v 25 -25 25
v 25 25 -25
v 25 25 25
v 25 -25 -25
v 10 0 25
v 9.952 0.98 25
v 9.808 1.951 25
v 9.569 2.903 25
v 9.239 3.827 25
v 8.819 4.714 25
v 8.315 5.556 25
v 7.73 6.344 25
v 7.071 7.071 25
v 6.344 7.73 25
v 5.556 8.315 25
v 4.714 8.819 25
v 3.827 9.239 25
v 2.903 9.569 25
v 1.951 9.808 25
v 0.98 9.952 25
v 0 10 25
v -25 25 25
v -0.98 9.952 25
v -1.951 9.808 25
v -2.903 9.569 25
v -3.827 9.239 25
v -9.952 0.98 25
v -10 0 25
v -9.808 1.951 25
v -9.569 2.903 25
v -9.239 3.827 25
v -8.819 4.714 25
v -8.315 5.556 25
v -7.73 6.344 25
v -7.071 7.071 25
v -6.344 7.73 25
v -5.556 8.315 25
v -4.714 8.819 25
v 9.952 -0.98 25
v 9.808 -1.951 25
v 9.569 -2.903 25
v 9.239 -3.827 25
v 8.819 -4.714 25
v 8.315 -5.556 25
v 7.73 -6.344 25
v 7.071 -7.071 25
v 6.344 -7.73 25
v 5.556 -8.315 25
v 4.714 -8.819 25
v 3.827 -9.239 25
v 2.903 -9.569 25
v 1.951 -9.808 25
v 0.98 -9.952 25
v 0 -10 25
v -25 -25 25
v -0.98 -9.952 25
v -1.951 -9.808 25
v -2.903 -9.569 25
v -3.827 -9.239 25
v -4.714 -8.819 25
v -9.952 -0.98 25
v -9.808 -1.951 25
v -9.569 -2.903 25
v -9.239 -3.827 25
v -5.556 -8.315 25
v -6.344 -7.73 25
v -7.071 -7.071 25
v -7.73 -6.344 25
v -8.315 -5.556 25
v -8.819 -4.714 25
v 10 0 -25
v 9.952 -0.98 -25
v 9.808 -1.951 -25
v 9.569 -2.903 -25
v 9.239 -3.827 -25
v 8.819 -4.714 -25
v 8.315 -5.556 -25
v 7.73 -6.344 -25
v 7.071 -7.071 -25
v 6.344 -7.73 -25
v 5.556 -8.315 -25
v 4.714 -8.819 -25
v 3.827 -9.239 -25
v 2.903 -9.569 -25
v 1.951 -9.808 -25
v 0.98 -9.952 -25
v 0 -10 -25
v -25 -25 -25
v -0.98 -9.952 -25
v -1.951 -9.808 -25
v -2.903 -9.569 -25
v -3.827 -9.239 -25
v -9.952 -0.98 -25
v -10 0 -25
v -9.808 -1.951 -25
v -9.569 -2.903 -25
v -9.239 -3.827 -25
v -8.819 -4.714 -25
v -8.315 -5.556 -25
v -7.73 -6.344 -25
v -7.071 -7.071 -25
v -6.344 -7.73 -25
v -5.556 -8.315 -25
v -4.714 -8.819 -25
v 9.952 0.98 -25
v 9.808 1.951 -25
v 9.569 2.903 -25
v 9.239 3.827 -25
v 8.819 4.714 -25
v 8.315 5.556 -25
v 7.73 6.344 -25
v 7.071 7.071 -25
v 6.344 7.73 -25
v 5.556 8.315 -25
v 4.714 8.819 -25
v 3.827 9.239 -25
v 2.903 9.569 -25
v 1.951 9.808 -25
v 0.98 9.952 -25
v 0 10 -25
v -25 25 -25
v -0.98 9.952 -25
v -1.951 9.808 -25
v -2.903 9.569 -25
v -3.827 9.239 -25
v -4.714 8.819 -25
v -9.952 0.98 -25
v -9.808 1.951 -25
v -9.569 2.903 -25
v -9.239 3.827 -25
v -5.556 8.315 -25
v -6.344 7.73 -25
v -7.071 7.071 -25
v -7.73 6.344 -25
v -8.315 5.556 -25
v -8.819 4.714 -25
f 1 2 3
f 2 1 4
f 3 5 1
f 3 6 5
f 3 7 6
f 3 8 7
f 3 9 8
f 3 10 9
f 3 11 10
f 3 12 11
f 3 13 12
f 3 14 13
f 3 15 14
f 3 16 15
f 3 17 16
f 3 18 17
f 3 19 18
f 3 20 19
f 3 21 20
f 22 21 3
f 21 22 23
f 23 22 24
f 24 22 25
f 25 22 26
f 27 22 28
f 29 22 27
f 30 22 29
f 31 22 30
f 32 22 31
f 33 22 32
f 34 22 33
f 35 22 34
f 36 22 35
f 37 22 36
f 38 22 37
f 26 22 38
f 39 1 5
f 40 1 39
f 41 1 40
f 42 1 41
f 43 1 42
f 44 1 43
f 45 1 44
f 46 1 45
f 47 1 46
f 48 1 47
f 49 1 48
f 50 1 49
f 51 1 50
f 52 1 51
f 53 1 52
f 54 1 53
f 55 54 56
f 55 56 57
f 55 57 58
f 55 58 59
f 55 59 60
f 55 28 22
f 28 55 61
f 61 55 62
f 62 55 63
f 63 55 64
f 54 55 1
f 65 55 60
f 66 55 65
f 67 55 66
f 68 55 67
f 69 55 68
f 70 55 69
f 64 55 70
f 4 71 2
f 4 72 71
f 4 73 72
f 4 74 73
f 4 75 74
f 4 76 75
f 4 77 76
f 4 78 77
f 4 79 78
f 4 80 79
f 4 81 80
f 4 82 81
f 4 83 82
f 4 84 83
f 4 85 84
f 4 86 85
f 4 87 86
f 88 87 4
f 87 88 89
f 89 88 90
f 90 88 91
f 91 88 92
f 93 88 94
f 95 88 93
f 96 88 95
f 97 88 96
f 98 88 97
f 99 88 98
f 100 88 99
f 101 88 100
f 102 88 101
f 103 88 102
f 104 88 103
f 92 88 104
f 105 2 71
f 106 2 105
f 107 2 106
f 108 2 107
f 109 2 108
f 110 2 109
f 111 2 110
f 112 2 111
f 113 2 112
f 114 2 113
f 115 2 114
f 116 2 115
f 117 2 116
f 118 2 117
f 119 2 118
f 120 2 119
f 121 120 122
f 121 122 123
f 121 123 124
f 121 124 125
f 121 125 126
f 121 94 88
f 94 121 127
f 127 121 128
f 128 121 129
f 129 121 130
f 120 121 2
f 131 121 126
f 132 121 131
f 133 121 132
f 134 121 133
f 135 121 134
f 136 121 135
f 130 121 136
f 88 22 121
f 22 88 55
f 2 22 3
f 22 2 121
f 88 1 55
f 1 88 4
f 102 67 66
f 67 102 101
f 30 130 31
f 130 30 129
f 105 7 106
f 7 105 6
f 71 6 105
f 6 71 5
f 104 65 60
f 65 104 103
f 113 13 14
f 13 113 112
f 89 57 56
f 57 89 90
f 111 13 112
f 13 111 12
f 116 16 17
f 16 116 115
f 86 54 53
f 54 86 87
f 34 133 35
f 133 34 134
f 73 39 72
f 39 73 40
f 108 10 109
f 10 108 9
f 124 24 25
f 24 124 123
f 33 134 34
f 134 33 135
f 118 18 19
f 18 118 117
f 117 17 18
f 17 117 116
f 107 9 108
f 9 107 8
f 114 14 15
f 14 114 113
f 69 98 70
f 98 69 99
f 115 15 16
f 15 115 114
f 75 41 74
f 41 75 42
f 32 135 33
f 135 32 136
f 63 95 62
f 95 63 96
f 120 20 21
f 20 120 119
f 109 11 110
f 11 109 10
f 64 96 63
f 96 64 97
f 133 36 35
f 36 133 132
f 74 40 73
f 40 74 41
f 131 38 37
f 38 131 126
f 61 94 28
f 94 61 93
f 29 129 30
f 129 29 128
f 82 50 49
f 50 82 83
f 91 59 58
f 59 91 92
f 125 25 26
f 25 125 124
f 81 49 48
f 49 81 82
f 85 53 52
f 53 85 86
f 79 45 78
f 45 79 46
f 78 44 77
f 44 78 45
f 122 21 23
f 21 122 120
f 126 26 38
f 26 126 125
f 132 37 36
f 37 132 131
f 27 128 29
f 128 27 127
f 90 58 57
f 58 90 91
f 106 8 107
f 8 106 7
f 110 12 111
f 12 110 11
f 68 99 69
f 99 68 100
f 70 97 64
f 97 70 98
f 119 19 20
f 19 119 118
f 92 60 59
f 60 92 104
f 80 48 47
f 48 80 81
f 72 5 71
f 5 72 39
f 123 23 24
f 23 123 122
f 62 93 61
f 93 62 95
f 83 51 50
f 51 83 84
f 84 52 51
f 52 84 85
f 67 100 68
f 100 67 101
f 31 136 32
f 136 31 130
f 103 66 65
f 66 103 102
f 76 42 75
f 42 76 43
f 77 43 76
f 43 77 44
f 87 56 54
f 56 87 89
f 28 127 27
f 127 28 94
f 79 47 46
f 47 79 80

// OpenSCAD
$fn = 64;
difference() {
    cube([50, 50, 50], center = true);
    cylinder(h = 60, r = 10, center = true);
}
